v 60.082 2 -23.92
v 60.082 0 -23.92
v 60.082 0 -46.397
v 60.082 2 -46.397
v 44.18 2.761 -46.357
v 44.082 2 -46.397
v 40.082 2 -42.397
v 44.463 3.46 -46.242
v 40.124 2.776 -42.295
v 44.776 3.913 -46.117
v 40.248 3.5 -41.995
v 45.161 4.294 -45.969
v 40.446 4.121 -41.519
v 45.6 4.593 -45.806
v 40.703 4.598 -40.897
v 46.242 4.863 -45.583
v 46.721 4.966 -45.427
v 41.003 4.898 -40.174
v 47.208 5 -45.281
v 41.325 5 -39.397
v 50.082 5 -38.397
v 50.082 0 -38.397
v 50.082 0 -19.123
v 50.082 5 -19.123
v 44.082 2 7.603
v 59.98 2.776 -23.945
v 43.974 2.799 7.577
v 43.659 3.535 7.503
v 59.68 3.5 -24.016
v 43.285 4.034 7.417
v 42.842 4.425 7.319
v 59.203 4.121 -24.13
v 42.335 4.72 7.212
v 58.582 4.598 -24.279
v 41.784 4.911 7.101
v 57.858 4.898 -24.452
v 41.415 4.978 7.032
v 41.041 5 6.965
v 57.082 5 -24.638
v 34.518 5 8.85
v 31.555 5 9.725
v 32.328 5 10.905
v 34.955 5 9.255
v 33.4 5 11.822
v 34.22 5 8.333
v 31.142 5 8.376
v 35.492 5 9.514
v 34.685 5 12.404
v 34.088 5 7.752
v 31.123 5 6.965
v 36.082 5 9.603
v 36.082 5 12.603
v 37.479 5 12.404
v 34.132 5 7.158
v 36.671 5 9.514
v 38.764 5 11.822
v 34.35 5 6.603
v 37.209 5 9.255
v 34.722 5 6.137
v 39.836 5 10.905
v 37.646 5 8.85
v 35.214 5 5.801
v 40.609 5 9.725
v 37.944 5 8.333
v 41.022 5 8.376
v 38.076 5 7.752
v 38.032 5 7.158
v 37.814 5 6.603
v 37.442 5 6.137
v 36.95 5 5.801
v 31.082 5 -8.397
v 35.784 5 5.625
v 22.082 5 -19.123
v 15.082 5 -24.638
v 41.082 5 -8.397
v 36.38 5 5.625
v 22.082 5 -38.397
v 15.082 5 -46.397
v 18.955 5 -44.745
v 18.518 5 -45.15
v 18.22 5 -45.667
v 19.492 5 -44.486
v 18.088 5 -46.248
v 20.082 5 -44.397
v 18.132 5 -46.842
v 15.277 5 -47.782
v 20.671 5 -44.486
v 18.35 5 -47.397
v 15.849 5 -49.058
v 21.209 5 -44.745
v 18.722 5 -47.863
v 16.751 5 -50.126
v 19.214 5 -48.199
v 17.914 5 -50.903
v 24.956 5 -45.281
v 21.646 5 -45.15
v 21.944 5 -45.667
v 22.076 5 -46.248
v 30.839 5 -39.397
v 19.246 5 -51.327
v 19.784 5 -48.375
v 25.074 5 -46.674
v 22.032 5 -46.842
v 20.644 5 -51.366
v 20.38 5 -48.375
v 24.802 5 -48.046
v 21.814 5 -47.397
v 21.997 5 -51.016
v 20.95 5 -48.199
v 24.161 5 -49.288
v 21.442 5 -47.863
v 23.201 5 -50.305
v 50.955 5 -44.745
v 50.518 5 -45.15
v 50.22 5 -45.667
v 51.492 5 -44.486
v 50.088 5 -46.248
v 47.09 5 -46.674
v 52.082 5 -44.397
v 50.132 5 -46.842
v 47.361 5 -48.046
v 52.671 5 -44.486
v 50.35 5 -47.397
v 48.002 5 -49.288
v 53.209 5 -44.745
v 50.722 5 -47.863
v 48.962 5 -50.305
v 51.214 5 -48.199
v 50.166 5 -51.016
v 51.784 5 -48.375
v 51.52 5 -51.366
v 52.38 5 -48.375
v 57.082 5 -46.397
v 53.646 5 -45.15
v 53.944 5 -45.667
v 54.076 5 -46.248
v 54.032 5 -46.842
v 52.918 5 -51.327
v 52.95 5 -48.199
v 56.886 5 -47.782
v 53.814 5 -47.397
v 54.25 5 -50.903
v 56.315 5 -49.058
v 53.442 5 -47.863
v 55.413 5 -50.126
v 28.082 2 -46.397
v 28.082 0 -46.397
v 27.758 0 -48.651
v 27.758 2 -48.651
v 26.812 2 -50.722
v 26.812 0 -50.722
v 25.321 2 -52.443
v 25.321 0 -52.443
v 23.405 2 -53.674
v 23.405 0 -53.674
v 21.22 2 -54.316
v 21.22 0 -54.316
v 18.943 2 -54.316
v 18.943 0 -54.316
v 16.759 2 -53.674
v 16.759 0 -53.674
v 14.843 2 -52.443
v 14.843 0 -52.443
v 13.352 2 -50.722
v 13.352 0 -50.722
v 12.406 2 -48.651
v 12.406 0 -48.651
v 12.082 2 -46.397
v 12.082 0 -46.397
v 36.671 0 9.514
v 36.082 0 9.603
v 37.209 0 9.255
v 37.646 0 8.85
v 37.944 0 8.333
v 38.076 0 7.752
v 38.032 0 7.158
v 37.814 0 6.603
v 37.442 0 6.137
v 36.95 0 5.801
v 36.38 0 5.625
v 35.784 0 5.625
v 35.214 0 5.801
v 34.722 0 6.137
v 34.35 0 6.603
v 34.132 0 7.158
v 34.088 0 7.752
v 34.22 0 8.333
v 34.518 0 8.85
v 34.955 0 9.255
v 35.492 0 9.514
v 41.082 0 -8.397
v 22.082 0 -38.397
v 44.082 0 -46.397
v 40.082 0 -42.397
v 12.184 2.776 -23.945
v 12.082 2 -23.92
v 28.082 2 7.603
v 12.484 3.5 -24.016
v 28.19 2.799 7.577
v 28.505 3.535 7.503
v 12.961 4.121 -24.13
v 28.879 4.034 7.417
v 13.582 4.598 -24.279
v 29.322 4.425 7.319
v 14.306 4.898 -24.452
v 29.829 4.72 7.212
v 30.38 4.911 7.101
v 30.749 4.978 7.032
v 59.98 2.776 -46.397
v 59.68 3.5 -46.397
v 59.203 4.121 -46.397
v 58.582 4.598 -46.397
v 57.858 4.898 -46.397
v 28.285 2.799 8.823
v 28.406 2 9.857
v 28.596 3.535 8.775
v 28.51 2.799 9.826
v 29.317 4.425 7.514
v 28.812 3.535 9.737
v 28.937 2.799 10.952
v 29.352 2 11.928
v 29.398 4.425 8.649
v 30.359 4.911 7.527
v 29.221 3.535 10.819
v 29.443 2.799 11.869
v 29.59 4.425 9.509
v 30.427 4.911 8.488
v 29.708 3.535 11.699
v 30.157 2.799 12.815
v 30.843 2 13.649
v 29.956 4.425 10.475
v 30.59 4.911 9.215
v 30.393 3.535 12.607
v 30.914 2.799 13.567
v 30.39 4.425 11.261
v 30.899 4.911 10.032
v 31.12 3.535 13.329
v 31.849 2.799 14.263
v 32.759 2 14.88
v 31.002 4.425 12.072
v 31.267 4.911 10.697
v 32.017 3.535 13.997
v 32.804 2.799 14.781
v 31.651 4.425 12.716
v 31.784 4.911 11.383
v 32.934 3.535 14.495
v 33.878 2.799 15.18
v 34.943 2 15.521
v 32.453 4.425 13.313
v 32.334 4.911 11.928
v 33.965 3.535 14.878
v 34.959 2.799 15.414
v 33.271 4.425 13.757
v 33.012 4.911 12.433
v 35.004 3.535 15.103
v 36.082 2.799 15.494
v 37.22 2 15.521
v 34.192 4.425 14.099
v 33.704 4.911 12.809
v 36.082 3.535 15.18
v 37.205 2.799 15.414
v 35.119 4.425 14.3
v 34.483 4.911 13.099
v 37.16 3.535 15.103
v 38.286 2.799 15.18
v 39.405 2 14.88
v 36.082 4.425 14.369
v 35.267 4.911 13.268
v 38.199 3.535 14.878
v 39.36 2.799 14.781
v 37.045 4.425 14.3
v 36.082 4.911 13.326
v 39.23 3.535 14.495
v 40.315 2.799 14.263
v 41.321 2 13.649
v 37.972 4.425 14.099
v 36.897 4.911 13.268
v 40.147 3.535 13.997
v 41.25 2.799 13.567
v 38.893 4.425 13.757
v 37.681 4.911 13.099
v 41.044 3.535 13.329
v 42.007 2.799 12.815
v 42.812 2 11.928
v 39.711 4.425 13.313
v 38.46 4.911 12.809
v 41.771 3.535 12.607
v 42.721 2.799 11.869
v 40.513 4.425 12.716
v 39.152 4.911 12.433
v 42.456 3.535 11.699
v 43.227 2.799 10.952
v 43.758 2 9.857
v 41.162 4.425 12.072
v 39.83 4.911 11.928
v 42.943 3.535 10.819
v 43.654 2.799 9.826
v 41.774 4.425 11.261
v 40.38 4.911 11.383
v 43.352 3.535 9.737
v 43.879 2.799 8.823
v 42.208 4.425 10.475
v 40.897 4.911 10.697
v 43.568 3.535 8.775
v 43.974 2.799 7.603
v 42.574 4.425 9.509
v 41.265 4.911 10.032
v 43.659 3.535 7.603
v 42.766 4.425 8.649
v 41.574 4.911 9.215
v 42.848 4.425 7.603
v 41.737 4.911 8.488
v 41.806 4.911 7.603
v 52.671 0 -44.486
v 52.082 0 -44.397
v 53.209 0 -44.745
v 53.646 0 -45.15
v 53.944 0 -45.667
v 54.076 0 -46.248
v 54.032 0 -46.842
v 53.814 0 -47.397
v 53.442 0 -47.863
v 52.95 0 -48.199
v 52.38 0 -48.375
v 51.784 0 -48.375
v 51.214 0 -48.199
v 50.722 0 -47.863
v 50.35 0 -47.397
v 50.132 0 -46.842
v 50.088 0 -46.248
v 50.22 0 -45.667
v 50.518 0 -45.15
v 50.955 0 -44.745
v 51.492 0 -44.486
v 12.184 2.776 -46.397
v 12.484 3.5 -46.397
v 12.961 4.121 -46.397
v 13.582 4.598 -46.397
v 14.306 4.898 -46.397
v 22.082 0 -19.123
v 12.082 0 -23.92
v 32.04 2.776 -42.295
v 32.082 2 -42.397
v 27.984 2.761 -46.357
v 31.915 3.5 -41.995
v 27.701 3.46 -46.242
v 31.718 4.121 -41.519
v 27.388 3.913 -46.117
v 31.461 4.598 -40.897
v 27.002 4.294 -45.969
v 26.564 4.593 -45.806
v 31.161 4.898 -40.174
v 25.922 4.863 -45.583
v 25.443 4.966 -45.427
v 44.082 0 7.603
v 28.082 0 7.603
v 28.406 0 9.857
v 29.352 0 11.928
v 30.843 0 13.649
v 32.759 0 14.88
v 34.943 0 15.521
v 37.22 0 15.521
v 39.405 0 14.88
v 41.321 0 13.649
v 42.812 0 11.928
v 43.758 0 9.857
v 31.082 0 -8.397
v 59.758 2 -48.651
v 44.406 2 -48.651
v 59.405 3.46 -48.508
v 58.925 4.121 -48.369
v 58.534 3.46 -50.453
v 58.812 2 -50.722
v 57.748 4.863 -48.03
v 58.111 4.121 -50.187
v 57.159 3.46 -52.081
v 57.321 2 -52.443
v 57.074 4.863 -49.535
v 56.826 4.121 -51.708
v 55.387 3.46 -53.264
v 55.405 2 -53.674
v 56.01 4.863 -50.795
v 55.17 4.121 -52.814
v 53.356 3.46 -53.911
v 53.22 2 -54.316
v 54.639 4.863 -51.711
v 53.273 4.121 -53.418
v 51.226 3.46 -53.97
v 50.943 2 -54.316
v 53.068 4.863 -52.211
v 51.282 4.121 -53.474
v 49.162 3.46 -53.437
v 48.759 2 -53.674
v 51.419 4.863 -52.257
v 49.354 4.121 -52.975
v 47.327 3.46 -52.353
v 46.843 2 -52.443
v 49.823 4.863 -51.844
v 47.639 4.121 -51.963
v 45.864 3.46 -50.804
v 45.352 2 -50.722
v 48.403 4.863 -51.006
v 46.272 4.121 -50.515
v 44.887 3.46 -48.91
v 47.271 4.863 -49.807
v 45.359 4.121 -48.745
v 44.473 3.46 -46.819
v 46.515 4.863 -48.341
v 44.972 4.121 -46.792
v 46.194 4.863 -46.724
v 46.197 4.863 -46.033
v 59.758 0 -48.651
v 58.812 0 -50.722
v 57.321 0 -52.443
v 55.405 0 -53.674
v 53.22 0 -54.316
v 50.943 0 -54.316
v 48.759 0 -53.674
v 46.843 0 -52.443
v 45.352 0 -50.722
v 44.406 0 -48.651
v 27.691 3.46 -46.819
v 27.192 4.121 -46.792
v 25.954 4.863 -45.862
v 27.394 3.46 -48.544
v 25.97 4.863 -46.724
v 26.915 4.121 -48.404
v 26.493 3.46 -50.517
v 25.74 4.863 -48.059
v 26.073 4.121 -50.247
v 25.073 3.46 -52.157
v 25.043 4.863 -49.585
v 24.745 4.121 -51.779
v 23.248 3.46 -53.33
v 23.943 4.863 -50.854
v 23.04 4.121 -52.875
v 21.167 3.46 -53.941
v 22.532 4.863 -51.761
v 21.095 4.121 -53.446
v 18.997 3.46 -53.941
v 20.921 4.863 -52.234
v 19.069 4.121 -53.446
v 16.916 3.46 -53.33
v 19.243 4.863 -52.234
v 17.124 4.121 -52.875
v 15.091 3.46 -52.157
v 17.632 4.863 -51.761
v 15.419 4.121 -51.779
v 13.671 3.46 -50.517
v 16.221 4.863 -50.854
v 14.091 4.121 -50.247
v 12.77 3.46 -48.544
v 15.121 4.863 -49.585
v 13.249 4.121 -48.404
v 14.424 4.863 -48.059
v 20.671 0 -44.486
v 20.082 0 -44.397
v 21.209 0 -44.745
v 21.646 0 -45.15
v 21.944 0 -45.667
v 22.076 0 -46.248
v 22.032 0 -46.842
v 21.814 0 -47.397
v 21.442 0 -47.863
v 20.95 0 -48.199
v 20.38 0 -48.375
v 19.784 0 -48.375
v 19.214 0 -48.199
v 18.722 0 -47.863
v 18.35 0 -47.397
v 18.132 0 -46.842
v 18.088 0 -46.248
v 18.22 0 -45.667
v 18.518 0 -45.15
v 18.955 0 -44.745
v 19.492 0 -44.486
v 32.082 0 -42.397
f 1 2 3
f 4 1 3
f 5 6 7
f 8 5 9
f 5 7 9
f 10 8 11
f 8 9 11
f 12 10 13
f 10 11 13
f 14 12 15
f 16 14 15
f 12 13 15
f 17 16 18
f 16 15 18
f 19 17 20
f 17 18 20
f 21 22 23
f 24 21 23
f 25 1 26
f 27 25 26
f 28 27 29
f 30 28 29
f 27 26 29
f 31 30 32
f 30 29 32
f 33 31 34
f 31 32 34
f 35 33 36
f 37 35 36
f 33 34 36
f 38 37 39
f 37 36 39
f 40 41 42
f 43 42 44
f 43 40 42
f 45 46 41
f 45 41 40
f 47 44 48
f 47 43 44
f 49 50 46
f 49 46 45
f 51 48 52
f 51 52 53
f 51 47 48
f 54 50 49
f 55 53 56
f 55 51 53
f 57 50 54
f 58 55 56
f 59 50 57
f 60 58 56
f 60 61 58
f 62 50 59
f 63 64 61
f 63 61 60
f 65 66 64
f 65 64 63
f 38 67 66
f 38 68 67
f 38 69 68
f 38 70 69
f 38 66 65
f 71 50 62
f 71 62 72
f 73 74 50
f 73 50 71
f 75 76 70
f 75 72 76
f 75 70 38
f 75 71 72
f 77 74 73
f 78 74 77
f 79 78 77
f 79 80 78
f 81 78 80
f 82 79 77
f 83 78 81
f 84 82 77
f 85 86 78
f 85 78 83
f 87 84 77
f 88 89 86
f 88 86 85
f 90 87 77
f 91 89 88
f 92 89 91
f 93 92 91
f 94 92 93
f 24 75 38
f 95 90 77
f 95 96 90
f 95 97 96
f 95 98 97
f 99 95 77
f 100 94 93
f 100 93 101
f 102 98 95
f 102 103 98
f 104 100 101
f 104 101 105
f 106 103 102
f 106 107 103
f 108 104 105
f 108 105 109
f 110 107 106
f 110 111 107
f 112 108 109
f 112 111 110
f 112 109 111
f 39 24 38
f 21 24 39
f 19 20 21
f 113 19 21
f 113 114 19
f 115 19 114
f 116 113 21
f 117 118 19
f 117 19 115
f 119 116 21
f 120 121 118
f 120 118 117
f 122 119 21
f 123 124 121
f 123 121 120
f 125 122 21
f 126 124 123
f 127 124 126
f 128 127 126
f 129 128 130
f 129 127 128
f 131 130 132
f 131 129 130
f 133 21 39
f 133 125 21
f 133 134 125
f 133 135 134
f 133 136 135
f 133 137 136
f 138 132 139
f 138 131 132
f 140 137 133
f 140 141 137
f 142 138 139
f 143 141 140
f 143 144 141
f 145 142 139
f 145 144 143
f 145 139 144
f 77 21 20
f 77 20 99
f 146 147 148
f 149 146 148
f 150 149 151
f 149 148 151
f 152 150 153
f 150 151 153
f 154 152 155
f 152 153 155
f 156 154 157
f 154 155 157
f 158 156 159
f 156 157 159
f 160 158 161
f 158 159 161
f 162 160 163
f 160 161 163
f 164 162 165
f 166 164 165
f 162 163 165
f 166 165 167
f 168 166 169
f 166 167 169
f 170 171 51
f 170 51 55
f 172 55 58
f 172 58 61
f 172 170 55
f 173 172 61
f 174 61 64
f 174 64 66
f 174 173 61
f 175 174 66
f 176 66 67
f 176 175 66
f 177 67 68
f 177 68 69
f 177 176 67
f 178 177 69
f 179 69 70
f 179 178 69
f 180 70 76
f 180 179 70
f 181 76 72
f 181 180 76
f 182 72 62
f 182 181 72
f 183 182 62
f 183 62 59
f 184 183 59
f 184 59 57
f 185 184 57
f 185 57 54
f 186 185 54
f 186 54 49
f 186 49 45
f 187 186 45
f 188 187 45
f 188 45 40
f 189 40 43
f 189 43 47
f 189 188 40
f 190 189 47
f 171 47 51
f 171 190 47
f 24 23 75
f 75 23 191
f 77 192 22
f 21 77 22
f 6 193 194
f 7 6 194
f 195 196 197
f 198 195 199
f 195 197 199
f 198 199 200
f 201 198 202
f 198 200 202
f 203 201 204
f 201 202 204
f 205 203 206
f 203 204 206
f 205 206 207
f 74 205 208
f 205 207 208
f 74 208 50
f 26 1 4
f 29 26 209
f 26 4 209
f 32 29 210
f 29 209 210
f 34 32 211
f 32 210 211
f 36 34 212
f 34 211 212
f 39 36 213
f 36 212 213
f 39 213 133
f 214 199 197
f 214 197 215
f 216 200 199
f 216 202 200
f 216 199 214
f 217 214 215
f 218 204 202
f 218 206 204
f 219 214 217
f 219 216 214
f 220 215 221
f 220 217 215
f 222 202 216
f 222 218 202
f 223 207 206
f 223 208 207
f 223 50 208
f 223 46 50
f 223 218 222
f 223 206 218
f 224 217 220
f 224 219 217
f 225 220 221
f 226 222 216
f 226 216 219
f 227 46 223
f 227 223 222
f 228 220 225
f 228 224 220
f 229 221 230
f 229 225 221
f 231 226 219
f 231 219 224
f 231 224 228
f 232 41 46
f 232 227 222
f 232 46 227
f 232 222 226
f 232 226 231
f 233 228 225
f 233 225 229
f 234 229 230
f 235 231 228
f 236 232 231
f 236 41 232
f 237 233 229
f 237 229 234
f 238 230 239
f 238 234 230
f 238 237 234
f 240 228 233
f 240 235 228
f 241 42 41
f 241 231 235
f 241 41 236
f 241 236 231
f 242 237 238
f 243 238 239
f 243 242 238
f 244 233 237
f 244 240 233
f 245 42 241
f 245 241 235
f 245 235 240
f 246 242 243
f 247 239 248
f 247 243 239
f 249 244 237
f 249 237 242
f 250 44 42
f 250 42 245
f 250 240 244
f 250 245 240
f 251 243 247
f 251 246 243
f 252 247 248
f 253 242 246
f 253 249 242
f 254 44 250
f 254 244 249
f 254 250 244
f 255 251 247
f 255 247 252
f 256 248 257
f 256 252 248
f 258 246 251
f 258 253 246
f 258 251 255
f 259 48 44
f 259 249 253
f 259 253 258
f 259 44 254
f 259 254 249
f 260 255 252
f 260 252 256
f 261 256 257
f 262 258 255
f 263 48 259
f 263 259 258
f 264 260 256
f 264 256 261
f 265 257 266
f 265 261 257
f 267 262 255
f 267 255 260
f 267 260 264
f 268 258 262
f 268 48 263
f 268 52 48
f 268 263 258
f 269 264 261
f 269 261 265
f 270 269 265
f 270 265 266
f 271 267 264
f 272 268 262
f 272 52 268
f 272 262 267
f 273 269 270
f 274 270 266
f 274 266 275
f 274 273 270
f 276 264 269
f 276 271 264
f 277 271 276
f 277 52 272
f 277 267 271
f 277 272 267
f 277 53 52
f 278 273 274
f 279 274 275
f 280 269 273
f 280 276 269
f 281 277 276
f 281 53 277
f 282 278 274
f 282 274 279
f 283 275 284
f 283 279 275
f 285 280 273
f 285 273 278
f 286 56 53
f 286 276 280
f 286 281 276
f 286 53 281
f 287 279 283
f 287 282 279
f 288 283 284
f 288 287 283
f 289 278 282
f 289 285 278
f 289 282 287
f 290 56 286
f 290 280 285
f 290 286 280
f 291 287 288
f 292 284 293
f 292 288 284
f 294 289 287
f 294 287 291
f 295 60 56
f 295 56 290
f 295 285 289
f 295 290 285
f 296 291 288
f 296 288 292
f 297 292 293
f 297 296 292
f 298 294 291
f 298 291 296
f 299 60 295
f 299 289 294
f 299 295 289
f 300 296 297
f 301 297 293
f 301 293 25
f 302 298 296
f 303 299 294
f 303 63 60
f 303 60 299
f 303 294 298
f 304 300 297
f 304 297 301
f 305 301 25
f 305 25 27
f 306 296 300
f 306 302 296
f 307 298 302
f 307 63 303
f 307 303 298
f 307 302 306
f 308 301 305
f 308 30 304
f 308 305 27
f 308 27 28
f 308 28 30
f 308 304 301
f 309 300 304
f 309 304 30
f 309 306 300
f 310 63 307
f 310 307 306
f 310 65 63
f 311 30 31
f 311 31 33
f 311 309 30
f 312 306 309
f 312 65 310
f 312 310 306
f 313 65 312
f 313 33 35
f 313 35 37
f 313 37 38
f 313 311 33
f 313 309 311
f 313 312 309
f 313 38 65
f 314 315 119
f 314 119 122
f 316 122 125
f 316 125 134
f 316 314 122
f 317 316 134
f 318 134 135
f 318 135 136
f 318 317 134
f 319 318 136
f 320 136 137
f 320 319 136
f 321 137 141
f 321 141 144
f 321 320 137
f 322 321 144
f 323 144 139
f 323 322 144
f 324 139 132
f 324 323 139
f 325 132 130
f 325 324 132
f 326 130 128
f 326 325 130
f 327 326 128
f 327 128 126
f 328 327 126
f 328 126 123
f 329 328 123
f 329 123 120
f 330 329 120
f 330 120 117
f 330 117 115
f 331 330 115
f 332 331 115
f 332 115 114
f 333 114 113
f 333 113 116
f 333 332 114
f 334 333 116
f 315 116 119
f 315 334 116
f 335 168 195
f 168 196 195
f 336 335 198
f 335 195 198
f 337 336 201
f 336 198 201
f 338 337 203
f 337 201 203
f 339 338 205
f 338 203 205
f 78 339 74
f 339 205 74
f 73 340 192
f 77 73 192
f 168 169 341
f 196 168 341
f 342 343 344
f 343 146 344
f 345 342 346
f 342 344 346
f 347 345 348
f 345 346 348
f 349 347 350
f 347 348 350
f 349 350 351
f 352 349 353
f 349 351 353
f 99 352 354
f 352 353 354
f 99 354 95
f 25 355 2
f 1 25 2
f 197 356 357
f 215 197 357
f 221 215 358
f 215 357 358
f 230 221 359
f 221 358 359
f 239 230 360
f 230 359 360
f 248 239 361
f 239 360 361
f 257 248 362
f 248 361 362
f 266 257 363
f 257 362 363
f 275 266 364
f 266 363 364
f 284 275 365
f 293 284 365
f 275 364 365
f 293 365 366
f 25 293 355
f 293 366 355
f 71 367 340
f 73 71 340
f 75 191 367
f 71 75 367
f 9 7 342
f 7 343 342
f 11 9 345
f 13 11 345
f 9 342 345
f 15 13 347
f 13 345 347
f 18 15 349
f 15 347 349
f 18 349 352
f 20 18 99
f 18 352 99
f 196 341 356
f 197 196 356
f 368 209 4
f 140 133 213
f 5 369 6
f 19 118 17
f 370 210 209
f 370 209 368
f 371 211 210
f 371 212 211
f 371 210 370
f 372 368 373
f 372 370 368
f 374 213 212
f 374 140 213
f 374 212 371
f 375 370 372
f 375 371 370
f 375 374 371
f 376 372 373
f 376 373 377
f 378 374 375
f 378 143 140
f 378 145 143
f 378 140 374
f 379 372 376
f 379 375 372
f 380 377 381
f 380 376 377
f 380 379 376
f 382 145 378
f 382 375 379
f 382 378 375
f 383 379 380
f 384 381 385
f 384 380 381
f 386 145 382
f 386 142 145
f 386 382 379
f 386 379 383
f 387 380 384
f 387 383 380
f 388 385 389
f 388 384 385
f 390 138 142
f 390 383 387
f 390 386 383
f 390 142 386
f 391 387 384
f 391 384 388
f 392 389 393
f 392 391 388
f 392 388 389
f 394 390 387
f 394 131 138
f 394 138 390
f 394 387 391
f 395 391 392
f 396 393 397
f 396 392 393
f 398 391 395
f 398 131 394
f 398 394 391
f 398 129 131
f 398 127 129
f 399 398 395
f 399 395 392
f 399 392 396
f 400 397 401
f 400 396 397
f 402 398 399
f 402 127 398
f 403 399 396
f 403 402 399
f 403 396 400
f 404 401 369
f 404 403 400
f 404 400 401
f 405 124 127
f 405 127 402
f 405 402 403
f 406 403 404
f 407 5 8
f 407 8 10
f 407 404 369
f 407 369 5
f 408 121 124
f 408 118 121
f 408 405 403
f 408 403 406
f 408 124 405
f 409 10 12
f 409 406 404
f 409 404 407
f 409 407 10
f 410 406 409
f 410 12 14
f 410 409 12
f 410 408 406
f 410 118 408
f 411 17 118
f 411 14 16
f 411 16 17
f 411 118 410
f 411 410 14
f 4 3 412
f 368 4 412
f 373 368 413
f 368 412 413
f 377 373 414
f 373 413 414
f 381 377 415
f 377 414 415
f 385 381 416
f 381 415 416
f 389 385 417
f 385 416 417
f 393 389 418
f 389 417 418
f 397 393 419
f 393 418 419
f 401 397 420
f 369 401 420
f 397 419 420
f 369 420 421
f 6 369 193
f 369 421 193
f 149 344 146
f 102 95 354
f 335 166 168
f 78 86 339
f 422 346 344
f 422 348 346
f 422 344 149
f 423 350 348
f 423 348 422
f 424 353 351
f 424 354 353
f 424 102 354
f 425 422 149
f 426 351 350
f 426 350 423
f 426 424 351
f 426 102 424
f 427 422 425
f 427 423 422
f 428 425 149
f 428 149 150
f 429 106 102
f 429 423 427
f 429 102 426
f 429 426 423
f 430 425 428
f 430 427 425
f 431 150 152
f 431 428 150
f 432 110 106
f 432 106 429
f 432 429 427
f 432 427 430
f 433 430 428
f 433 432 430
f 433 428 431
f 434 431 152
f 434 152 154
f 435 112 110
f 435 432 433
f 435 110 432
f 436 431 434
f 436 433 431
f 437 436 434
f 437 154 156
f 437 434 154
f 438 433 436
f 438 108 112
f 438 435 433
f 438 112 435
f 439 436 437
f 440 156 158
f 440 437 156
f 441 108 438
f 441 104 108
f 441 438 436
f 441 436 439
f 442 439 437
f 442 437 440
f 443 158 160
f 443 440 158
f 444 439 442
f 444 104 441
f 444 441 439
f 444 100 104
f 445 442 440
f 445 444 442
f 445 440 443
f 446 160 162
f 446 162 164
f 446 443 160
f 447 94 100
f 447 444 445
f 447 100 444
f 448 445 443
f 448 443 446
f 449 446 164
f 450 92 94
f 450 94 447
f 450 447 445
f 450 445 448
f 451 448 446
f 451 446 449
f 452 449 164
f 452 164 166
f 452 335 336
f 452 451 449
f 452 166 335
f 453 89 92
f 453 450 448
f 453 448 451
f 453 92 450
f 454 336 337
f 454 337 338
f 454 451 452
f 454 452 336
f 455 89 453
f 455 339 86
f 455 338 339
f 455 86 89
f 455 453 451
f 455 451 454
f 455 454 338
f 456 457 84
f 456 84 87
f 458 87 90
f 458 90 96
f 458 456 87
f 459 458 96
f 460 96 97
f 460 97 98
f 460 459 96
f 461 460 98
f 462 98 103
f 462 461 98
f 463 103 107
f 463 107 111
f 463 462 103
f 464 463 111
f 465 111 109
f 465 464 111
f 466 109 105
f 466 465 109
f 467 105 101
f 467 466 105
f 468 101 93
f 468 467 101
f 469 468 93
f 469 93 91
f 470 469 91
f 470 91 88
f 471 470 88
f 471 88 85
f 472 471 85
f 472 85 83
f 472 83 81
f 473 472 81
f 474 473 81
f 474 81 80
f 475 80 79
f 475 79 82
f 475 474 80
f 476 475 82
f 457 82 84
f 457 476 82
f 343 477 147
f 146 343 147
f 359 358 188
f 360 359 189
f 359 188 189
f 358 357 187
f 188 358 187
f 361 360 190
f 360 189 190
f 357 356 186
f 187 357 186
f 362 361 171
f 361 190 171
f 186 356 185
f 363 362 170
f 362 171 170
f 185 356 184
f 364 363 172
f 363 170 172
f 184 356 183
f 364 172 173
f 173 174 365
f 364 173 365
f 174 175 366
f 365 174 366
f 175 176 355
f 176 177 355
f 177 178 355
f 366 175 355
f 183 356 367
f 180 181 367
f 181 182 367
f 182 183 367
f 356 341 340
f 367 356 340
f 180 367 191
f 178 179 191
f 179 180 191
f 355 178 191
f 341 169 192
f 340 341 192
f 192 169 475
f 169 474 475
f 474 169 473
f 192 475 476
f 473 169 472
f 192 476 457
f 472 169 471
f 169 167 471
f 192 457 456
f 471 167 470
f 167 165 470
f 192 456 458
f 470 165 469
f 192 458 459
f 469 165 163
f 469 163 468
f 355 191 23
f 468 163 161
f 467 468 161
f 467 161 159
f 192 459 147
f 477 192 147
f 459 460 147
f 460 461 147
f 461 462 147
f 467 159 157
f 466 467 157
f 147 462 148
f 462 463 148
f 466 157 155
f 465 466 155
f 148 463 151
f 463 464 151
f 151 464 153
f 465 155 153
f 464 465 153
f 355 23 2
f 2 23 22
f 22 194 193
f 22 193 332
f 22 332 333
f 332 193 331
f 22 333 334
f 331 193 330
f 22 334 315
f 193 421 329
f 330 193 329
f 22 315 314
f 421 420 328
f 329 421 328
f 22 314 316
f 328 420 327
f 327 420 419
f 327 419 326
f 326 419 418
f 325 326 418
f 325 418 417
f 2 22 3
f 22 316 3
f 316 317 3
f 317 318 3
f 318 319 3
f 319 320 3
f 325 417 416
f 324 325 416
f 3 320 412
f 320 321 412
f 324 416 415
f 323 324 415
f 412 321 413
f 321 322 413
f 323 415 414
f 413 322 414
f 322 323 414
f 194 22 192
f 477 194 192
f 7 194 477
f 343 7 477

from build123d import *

# Parameters (mm, degrees)
SKETCH1_R           = 2
BOSS_EXTRUDE1_DEPTH = 5
FILLET2_R           = 3


with BuildPart() as part:
    # Sketch1 → Boss-Extrude1 (new body)
    with BuildSketch(Plane(origin=(0, 0, 0), x_dir=(1, 0, 0), z_dir=(0, 1, 0))):
        with BuildLine():
            Line((12.081978252, 23.920233872), (28.081978252, -7.602676631))
            ThreePointArc((28.081978252, -7.602676631), (36.081978252, -15.602676631), (44.081978252, -7.602676631))
            Line((44.081978252, -7.602676631), (60.081978252, 23.920233872))
            Line((60.081978252, 23.920233872), (60.081978252, 39.133054542))
            Line((60.081978252, 39.133054542), (60.081978252, 42.765188956))
            Line((60.081978252, 42.765188956), (60.081978252, 46.397323369))
            ThreePointArc((60.081978252, 46.397323369), (52.081978252, 54.397323369), (44.081978252, 46.397323369))
            Line((44.081978252, 46.397323369), (40.081978252, 42.397323369))
            Line((40.081978252, 42.397323369), (32.081978252, 42.397323369))
            Line((32.081978252, 42.397323369), (28.081978252, 46.397323369))
            ThreePointArc((28.081978252, 46.397323369), (20.081978252, 54.397323369), (12.081978252, 46.397323369))
            Line((12.081978252, 46.397323369), (12.081978252, 39.746064801))
            Line((12.081978252, 39.746064801), (12.081978252, 23.920233872))
        make_face()
        with Locations(Location((36.081978252, -7.602676631, 0), (0, 0, 270))):
            Circle(SKETCH1_R, mode=Mode.SUBTRACT)
        Polygon((22.081978252, 19.123105702), (22.081978252, 38.397323369), (50.081978252, 38.397323369), (50.081978252, 19.123105702), (41.081978252, 8.397323369), (36.081978252, 8.397323369), (31.081978252, 8.397323369), align=None, mode=Mode.SUBTRACT)
        with Locations(Location((20.081978252, 46.397323369, 0), (0, 0, 270))):
            Circle(SKETCH1_R, mode=Mode.SUBTRACT)
        with Locations(Location((52.081978252, 46.397323369, 0), (0, 0, 270))):
            Circle(SKETCH1_R, mode=Mode.SUBTRACT)
    extrude(amount=BOSS_EXTRUDE1_DEPTH)

    # Fillet2
    fillet2_edges = [part.edges().sort_by_distance(p)[0] for p in [
        (12.081978252, 5, -35.158778621),
        (20.081978252, 5, -8.158778621),
        (36.081978252, 5, 15.602676631),
        (52.081978252, 5, -8.158778621),
        (60.081978252, 5, -35.158778621),
        (52.081978252, 5, -54.397323369),
        (42.081978252, 5, -44.397323369),
        (36.081978252, 5, -42.397323369),
        (30.081978252, 5, -44.397323369),
        (20.081978252, 5, -54.397323369),
    ]]
    fillet(fillet2_edges, radius=FILLET2_R)


solid = part.part
